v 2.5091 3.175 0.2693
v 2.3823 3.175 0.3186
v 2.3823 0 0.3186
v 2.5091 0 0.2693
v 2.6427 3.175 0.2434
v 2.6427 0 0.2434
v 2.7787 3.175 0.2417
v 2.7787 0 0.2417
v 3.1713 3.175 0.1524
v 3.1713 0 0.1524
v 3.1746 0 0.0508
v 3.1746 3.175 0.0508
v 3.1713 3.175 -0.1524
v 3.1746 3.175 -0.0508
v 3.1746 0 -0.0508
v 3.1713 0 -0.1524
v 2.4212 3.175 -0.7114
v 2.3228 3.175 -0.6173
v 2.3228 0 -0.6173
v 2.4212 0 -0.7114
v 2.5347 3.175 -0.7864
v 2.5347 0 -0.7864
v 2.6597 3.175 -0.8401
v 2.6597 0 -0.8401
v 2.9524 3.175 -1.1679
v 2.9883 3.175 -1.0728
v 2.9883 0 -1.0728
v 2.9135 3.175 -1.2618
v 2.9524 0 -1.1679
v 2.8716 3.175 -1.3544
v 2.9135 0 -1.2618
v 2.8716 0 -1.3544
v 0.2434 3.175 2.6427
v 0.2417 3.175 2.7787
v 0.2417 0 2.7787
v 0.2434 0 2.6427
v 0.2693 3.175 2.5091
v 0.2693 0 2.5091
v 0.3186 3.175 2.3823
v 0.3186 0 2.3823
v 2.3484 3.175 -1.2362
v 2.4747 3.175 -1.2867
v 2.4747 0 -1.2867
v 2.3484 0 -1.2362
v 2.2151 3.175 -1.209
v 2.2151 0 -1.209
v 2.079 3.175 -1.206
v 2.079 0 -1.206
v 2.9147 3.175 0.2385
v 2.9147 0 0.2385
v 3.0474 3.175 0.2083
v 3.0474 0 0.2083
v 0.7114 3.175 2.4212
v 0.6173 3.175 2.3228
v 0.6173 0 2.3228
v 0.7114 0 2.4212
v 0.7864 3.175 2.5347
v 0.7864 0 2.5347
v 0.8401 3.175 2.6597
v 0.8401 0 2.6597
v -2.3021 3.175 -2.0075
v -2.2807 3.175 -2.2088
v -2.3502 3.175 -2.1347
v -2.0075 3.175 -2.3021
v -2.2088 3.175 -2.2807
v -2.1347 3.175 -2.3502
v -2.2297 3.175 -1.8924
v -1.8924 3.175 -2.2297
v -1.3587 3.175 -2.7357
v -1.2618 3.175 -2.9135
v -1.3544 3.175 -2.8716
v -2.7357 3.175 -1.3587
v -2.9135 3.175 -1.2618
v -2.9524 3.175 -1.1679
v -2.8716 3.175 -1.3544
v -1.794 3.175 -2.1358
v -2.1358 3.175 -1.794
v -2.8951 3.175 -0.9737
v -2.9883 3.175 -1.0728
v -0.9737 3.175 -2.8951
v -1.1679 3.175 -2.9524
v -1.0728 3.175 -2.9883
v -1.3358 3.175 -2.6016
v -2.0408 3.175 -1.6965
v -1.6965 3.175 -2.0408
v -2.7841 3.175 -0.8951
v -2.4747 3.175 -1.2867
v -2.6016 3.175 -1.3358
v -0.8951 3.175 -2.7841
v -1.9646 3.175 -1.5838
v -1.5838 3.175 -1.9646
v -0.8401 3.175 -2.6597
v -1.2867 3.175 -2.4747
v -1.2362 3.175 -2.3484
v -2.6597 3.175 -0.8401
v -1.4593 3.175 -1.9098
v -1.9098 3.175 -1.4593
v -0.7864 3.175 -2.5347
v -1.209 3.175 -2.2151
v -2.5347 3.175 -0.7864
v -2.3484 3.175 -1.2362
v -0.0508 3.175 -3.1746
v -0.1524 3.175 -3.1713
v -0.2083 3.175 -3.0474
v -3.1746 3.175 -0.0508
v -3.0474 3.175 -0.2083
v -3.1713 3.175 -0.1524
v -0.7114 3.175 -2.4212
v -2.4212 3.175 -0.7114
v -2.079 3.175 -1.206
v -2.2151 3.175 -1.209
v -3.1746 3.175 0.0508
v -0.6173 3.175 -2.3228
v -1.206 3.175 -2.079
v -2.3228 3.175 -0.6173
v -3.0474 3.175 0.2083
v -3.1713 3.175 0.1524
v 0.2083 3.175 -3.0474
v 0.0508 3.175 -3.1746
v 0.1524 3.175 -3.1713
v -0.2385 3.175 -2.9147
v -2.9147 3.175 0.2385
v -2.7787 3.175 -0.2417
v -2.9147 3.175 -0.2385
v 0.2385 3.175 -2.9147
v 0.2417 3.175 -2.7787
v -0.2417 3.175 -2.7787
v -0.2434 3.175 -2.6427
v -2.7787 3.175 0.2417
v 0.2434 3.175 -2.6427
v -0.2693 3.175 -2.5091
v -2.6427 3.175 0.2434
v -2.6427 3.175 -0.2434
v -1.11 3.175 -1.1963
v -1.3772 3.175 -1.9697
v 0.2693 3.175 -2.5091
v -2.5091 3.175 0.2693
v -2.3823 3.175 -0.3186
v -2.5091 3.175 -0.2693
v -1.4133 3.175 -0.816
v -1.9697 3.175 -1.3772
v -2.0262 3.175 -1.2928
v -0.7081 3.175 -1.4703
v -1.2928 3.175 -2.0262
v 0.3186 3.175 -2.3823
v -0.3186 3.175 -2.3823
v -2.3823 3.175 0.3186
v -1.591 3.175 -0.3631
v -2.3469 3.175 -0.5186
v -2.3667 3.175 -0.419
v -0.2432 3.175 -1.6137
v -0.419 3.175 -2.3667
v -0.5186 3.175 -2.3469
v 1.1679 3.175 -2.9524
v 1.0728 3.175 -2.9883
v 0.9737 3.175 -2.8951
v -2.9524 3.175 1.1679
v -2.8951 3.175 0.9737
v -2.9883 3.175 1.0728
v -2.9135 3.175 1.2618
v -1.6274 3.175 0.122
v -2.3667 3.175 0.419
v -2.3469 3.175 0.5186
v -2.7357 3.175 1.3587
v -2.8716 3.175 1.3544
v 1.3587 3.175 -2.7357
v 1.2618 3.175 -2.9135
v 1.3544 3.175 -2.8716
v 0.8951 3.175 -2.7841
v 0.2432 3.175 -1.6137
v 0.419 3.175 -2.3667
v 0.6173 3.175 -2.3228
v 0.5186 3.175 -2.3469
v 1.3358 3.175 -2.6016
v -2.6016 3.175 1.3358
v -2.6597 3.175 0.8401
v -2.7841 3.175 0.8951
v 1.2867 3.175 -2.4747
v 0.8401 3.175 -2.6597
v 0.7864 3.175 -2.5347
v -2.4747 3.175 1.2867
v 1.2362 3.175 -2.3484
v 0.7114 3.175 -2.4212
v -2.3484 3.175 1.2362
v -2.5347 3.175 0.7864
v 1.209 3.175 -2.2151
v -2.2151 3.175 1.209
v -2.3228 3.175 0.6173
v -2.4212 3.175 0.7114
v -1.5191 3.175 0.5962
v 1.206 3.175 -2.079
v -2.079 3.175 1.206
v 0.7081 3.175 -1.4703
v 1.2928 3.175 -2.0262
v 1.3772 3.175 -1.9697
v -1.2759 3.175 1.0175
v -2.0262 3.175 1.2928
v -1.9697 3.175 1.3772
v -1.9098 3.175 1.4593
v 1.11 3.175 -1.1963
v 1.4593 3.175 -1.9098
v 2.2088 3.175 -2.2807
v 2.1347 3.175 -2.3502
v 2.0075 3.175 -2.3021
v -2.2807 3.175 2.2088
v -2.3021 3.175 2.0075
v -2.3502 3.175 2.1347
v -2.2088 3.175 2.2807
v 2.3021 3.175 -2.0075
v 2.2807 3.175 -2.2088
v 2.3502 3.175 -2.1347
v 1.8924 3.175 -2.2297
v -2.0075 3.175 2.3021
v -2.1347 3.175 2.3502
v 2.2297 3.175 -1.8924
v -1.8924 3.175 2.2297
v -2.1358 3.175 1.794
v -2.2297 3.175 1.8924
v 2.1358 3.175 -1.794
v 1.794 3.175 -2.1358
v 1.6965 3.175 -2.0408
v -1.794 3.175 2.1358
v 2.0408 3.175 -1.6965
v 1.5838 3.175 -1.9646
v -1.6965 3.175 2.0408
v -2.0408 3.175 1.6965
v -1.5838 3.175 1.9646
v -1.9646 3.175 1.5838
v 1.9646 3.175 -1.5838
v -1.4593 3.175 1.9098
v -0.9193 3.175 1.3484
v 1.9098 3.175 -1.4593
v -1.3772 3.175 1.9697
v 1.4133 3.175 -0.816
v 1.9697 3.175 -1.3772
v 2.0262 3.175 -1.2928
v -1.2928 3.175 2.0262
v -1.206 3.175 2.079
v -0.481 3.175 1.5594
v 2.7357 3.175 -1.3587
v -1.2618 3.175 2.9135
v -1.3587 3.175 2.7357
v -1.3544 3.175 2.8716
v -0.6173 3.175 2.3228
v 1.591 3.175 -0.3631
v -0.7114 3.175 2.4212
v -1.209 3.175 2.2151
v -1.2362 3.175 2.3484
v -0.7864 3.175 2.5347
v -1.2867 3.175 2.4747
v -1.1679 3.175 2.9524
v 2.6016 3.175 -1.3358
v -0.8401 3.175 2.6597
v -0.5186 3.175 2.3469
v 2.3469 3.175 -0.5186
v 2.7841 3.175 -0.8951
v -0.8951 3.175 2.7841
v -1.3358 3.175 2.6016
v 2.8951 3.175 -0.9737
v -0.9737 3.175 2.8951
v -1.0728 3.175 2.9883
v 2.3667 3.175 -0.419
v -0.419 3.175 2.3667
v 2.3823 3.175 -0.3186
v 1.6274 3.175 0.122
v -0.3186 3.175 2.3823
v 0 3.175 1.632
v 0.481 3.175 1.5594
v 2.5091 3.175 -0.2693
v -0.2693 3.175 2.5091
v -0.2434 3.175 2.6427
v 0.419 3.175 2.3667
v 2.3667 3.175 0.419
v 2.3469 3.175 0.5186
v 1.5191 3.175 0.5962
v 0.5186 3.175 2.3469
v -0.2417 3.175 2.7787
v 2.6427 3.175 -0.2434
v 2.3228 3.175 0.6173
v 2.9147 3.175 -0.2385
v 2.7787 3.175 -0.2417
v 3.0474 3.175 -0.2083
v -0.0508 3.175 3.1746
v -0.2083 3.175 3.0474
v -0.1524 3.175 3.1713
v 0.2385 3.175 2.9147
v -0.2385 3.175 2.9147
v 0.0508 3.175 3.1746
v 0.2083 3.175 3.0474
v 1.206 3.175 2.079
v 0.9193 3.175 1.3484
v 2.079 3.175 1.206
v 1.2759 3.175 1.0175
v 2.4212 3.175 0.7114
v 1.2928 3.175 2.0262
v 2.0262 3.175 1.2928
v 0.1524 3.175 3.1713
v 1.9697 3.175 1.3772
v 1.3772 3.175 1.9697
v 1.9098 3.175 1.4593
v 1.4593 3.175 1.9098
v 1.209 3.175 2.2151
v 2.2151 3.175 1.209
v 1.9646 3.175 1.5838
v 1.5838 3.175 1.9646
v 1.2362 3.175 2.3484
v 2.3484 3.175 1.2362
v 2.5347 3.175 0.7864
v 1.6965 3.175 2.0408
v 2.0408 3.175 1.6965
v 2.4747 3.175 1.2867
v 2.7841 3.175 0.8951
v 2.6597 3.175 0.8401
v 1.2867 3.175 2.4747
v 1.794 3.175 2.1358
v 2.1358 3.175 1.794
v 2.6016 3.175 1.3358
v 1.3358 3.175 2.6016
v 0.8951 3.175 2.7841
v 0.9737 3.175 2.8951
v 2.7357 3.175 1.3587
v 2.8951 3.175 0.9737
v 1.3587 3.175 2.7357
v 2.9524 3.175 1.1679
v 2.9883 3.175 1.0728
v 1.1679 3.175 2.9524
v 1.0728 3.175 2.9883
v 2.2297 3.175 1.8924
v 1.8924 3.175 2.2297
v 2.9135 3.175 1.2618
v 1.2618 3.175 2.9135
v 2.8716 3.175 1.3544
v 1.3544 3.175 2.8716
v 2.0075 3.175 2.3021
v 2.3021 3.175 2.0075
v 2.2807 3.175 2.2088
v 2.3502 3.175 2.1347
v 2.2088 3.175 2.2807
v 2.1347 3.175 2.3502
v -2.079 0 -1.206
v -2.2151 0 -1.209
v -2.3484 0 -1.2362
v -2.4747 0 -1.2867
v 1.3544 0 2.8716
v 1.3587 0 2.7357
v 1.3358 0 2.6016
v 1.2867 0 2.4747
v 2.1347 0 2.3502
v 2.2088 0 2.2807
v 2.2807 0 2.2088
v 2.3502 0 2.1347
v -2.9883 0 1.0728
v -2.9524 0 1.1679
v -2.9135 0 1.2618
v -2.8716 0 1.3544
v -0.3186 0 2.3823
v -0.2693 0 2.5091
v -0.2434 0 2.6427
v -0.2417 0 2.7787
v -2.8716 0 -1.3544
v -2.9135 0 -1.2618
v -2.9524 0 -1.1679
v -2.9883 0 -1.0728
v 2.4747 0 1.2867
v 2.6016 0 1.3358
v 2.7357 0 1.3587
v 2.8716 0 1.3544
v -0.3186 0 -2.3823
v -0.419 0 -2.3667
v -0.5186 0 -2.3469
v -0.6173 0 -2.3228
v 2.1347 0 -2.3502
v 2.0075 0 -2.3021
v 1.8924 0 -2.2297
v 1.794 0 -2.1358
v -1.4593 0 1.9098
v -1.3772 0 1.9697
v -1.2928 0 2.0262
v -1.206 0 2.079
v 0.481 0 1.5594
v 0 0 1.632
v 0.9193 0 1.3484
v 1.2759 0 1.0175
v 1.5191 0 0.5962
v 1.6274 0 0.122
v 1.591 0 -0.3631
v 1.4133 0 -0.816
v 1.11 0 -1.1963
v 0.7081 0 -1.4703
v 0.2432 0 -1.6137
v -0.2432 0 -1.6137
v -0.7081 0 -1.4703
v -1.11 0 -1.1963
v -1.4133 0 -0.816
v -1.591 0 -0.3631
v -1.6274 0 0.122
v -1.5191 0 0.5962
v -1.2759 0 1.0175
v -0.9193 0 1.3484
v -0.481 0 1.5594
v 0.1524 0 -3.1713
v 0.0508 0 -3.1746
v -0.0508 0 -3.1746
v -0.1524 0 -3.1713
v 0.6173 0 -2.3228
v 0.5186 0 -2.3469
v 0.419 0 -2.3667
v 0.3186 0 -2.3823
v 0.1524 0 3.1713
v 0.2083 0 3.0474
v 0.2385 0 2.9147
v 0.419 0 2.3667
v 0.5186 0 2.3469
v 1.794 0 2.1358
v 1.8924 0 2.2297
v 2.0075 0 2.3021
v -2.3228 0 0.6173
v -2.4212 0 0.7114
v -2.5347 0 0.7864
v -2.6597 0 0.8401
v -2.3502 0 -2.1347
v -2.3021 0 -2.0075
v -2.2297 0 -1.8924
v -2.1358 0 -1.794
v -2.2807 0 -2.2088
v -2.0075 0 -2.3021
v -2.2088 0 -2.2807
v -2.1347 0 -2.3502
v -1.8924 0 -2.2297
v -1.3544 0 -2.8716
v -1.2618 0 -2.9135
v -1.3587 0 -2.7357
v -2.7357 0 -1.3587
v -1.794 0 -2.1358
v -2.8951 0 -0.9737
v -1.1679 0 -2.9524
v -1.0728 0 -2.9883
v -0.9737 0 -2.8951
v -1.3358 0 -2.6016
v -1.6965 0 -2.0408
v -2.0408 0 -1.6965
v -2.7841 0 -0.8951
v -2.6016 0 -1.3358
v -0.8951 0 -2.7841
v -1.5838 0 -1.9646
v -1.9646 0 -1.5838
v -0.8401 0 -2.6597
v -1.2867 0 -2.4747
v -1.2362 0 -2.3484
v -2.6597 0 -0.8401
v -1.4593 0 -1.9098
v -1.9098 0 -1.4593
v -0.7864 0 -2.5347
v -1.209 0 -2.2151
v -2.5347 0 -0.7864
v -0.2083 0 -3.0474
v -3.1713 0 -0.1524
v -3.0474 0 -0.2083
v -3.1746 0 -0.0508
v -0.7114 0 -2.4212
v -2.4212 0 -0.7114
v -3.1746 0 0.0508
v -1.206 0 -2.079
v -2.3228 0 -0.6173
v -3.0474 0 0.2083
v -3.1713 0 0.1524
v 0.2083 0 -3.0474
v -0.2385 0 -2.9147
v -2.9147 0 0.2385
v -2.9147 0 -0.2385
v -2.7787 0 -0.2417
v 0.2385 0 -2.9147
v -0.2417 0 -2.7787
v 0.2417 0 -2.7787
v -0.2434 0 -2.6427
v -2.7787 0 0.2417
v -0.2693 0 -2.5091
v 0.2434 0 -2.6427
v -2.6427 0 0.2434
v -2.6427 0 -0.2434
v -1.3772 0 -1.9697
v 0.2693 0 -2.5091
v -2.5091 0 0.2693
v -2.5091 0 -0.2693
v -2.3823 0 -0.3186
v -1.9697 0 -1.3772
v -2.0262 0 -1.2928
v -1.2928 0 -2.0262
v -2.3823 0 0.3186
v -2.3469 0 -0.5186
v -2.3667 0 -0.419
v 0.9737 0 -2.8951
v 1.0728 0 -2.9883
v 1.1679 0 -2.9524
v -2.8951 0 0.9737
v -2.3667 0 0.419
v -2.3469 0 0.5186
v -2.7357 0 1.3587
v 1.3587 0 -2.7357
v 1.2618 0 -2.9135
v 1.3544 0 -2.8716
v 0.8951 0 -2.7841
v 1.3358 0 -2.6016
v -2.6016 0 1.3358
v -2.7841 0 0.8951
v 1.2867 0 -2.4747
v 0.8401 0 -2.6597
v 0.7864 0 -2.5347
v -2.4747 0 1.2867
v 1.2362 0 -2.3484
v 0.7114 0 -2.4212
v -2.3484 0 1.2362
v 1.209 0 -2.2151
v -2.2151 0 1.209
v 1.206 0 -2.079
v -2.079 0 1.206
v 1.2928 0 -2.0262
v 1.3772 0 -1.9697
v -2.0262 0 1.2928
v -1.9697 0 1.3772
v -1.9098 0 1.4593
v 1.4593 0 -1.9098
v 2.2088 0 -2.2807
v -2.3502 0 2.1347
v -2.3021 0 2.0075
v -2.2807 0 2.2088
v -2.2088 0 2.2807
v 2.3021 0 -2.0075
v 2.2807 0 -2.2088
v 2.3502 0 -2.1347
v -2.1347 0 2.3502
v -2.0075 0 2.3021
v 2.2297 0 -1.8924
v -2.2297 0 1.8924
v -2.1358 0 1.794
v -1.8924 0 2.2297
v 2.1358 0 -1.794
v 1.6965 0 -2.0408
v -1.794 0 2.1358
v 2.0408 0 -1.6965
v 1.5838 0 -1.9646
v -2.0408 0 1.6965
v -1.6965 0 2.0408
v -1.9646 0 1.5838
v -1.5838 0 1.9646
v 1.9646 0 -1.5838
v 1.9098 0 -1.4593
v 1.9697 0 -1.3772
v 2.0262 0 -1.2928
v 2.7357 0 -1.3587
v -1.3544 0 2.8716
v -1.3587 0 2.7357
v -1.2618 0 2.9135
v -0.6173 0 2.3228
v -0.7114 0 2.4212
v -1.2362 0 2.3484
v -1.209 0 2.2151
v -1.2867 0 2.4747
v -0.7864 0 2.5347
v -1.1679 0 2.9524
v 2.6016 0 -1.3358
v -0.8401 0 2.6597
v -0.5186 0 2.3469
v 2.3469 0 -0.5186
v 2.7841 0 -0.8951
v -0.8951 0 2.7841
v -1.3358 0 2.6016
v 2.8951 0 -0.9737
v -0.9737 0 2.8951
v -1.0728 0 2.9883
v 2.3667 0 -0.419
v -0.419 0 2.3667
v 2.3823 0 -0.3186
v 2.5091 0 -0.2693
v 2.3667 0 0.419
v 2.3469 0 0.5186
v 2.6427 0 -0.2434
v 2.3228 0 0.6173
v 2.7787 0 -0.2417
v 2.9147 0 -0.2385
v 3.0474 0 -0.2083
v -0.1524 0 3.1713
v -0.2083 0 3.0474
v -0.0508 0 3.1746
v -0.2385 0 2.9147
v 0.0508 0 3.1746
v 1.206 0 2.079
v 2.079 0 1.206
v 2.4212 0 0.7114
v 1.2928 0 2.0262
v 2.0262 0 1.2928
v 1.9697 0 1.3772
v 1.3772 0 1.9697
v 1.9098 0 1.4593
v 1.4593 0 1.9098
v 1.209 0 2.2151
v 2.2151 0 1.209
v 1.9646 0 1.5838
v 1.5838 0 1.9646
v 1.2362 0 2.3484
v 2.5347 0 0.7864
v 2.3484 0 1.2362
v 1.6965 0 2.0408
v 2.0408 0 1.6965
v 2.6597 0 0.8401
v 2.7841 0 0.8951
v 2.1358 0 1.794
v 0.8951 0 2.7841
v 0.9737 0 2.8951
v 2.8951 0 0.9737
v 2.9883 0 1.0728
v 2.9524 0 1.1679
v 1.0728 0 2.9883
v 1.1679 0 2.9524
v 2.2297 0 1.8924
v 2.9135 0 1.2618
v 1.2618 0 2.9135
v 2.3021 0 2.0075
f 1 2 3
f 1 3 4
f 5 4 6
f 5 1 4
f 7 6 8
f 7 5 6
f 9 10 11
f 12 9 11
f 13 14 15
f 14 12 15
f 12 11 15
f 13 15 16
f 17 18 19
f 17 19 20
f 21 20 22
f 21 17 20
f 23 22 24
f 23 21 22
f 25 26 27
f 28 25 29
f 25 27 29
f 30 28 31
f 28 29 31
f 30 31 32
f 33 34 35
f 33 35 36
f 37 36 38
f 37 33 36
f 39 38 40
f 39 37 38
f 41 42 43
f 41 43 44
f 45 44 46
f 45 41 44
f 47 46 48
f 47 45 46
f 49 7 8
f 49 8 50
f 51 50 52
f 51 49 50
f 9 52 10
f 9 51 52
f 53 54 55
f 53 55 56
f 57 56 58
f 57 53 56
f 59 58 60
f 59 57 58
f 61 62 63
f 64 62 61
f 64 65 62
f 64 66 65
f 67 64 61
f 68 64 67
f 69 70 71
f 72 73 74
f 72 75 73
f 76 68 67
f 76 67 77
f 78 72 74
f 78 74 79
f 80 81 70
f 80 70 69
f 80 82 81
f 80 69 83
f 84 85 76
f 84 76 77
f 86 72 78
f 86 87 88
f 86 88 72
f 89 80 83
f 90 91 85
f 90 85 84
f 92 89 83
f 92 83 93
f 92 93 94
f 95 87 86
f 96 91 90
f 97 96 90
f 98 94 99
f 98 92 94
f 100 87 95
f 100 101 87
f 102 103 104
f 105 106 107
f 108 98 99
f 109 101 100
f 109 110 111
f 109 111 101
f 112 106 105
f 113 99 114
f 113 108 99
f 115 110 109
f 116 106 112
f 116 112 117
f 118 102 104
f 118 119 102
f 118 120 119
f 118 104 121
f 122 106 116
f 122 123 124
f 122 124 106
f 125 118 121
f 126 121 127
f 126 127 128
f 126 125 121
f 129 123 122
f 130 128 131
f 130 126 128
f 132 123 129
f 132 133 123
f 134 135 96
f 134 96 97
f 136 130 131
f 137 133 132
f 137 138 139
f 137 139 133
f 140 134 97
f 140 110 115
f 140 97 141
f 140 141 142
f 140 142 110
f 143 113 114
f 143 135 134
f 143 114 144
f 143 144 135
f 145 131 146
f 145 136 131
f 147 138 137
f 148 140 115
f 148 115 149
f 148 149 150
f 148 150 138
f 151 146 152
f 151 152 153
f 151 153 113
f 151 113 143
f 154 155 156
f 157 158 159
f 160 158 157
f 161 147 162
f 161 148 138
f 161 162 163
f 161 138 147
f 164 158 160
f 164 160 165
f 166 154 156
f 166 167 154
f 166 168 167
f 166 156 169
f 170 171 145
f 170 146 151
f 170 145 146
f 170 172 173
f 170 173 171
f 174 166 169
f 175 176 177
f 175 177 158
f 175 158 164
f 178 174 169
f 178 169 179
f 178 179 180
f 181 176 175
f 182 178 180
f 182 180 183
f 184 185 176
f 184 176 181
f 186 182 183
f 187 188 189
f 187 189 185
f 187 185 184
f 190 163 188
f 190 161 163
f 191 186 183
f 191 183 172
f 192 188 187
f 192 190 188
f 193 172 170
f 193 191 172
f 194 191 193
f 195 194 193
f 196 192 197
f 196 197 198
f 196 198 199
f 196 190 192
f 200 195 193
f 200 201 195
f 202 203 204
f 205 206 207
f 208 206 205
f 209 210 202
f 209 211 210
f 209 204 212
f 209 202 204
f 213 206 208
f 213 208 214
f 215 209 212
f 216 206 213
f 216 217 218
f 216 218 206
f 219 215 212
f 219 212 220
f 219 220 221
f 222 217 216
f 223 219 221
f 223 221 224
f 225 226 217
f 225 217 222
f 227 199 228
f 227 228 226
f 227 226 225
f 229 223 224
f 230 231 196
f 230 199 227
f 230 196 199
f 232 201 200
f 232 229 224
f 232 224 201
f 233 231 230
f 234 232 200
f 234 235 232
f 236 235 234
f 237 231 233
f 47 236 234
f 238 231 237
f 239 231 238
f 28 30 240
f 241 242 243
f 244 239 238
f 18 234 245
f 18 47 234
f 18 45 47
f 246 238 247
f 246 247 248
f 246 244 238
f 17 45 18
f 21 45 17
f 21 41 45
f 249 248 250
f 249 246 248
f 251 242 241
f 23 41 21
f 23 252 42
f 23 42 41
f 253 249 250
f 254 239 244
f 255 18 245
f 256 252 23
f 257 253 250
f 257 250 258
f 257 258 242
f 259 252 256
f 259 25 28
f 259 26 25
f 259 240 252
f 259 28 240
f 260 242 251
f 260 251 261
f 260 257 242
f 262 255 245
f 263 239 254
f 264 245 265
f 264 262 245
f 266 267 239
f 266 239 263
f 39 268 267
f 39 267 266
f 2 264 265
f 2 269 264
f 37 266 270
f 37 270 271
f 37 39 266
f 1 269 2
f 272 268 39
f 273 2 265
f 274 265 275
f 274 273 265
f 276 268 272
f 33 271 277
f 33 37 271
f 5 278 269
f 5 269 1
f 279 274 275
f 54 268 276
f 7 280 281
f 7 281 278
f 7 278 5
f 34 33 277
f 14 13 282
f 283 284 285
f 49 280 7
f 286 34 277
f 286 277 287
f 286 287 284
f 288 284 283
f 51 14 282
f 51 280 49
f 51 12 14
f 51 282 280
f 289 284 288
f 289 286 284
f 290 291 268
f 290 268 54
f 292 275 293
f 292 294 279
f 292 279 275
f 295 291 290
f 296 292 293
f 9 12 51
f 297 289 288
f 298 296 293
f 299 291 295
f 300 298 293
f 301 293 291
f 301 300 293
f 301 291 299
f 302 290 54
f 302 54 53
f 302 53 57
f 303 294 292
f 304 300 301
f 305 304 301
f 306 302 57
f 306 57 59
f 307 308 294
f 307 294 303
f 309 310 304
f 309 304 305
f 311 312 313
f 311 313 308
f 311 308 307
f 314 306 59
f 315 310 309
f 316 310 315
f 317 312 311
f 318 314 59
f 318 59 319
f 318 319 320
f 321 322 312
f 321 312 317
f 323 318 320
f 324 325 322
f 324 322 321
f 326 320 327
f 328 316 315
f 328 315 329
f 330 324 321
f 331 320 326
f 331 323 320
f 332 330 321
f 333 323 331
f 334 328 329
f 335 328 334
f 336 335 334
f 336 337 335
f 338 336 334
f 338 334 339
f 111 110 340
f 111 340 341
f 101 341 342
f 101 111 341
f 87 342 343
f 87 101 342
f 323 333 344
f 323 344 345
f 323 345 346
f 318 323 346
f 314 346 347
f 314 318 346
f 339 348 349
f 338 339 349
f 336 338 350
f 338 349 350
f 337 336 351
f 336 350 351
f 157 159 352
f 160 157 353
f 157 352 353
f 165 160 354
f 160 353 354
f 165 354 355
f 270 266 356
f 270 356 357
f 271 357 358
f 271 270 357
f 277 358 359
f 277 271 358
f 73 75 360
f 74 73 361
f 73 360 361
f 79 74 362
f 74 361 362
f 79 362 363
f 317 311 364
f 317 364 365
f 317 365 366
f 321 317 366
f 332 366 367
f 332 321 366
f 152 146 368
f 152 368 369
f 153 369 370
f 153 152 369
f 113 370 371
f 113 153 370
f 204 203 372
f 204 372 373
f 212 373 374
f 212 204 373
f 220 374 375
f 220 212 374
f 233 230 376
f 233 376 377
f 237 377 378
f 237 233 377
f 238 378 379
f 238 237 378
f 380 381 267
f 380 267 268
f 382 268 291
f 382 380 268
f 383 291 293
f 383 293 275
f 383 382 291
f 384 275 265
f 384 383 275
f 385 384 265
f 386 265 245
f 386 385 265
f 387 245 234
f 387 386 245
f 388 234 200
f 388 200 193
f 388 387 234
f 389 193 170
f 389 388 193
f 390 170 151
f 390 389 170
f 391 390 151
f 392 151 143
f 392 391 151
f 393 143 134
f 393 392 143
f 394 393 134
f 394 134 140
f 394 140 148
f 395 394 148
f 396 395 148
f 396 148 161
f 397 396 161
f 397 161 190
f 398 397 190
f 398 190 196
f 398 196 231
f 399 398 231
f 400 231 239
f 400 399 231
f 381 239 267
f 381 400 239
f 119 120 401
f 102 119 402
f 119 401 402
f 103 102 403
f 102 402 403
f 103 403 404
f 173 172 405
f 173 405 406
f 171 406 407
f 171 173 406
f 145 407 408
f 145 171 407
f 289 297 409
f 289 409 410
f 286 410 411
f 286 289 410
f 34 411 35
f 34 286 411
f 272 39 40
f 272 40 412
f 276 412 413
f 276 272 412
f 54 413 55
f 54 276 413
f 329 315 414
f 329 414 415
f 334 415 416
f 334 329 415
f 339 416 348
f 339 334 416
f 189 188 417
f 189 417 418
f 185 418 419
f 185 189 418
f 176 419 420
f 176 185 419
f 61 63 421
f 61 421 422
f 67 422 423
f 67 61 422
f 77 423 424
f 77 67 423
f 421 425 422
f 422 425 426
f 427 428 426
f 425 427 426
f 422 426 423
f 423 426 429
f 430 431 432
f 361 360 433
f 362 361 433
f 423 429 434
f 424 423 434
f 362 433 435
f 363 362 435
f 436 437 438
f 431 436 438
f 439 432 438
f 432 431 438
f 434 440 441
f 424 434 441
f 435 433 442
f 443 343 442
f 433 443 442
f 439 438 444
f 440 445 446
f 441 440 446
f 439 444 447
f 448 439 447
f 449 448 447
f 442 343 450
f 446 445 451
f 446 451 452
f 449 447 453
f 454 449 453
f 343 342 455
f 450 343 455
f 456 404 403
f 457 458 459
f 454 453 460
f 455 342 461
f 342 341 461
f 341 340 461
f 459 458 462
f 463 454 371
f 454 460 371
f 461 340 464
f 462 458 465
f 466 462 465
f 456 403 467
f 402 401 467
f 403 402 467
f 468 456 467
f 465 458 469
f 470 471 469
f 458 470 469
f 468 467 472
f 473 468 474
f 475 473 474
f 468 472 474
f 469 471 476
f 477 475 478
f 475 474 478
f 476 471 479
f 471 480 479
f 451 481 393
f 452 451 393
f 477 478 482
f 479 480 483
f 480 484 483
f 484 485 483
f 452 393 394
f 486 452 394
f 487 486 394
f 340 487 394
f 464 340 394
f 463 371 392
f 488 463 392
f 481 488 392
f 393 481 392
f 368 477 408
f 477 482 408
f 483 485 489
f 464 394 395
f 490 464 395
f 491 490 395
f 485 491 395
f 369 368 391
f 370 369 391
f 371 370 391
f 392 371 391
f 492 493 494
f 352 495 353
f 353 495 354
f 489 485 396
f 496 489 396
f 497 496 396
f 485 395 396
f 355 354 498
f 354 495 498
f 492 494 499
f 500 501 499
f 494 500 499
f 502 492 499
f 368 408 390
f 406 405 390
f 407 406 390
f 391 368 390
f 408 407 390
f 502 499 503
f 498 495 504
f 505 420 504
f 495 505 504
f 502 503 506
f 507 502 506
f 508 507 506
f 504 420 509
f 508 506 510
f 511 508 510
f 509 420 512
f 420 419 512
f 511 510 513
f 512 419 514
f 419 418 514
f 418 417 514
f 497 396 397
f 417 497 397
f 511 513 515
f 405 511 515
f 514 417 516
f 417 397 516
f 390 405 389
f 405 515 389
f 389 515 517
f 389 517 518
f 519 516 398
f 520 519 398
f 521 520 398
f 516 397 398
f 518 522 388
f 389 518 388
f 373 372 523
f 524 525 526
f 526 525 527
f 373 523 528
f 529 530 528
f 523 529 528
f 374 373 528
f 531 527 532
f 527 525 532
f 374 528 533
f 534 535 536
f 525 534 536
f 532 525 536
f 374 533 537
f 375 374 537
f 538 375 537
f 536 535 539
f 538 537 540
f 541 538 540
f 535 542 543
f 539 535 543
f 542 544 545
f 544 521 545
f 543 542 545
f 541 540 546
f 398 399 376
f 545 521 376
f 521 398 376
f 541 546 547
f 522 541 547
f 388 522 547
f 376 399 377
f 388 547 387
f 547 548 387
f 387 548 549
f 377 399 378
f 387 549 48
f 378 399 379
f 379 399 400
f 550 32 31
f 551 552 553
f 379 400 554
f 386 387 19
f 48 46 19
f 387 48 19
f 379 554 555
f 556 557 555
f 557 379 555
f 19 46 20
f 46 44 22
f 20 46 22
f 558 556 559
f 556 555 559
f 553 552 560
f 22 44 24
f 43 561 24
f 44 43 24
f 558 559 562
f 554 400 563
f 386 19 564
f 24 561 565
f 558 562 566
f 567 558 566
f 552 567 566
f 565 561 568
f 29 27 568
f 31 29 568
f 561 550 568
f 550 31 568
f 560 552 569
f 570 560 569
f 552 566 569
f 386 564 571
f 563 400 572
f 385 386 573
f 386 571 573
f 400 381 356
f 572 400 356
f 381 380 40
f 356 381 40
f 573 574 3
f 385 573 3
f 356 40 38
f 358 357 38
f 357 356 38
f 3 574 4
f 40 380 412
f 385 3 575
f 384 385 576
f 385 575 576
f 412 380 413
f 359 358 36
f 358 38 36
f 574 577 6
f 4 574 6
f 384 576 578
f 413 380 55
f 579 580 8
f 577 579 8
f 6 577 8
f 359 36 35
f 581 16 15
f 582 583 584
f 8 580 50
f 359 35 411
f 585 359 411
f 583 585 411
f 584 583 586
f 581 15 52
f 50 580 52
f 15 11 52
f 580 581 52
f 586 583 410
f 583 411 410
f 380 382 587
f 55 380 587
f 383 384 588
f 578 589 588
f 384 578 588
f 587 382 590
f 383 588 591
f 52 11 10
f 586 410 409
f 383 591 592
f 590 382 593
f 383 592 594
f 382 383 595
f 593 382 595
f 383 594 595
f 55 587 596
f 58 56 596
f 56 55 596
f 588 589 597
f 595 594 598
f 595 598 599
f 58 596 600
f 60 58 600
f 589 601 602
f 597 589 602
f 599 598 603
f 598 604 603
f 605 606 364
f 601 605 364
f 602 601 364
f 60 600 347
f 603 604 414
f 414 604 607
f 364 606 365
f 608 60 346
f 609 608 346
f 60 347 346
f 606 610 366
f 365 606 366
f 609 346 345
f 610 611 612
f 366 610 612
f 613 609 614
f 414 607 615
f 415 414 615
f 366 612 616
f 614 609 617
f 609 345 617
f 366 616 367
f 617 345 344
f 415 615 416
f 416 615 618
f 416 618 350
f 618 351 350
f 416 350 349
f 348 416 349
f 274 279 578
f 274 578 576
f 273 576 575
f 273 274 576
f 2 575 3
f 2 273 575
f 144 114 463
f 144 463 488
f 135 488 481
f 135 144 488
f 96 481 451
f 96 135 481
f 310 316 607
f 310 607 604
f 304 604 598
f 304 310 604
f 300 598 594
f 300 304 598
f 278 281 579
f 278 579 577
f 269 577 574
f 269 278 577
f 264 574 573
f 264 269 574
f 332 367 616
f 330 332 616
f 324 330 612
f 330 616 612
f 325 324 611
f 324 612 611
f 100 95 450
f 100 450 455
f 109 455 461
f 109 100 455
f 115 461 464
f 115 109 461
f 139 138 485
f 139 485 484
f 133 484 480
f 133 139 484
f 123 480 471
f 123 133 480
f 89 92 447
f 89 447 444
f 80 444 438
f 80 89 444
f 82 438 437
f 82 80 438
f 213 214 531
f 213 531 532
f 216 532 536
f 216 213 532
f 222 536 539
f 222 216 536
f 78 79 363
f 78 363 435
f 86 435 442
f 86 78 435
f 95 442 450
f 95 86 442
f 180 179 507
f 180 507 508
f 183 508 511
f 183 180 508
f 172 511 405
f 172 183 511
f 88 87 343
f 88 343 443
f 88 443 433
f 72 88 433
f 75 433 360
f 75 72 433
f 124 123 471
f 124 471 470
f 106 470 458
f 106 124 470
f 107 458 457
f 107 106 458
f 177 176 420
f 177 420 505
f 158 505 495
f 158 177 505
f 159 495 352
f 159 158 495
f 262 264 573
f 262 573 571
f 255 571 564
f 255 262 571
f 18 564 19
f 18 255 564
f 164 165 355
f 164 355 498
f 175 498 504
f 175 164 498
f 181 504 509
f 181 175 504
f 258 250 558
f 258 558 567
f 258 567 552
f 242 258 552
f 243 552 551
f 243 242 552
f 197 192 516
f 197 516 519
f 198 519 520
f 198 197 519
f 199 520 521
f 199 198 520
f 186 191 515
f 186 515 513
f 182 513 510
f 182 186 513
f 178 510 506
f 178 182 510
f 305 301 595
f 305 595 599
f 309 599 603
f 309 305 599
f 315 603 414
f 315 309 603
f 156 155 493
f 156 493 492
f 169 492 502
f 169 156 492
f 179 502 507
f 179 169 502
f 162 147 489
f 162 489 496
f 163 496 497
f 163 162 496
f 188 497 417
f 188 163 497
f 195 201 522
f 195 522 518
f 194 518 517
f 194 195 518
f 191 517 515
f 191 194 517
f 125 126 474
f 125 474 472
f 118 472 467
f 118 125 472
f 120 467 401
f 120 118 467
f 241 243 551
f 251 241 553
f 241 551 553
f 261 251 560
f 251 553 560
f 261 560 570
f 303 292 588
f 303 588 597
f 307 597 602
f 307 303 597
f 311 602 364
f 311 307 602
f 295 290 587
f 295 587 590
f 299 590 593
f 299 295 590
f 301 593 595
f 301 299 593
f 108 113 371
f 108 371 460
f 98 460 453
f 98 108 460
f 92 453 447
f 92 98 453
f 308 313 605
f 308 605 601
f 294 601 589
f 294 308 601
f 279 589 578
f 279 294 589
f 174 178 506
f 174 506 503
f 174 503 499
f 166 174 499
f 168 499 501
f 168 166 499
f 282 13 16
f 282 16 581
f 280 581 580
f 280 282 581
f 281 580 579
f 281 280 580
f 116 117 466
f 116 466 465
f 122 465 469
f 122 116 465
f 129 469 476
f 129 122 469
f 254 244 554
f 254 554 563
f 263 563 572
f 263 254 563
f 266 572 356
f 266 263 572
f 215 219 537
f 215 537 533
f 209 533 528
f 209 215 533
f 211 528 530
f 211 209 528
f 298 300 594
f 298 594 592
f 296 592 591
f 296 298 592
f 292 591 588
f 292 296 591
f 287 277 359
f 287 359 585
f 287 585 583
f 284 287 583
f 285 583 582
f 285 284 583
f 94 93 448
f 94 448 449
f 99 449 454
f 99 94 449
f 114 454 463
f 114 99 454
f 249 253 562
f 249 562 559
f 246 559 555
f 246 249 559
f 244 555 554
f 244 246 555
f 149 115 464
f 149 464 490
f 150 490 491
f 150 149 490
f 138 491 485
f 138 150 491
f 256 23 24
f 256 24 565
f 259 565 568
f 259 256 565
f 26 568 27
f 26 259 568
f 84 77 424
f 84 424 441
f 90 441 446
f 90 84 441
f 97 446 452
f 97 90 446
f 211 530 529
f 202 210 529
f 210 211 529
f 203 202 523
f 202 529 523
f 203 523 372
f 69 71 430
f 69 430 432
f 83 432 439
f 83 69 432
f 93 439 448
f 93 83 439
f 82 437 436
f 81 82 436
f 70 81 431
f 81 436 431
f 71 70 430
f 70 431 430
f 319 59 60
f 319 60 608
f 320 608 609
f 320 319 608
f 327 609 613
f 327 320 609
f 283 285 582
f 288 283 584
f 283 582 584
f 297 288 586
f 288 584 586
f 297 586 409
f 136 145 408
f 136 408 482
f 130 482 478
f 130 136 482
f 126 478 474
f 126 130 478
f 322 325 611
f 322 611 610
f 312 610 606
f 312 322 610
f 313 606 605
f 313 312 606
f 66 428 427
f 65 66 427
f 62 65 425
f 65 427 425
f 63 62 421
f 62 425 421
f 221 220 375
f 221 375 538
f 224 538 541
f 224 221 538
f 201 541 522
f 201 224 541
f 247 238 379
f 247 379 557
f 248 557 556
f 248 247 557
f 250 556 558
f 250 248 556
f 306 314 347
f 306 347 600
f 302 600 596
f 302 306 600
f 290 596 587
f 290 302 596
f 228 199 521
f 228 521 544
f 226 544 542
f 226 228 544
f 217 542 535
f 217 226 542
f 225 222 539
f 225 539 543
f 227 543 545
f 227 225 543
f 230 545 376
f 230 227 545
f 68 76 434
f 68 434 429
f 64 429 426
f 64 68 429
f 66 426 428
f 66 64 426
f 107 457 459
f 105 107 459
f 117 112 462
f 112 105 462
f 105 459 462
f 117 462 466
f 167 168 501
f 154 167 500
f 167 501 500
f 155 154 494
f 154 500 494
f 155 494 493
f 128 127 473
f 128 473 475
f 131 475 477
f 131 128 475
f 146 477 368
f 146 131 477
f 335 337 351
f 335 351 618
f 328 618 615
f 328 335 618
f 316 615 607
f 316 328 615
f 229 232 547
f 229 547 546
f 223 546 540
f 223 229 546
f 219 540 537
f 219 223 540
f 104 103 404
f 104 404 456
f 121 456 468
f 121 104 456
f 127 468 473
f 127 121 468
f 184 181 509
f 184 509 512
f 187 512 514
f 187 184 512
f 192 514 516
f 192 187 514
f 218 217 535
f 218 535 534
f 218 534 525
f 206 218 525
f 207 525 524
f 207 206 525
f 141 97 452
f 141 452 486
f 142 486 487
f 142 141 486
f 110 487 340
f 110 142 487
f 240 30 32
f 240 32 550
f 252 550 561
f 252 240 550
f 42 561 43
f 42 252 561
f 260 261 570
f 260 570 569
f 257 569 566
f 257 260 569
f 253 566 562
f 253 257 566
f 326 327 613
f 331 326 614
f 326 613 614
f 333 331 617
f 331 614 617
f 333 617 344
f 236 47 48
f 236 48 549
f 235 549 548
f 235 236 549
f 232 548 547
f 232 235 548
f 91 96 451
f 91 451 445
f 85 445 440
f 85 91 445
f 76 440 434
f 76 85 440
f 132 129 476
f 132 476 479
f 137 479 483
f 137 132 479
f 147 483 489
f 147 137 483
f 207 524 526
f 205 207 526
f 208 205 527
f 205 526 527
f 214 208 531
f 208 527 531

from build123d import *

# Parameters (mm, degrees)
SKETCH1_R           = 3.175
SKETCH1_R_2         = 1.63195
BOSS_EXTRUDE1_DEPTH = 3.175
CUT_EXTRUDE1_DEPTH  = 6.499261314
CIRPATTERN1_COUNT   = 16


with BuildPart() as part:
    # Sketch1 → Boss-Extrude1 (new body)
    with BuildSketch(Plane(origin=(0, 0, 0), x_dir=(1, 0, 0), z_dir=(0, 1, 0))):
        with Locations(Location((0, 0, 0), (0, 0, 270))):
            Circle(SKETCH1_R)
        with Locations(Location((0, 0, 0), (0, 0, 270))):
            Circle(SKETCH1_R_2, mode=Mode.SUBTRACT)
    extrude(amount=BOSS_EXTRUDE1_DEPTH)

    # Sketch2 → Cut-Extrude1 (cut, through all)
    with BuildSketch(Plane(origin=(0, 3.175, 0), x_dir=(1, 0, 0), z_dir=(0, 1, 0))):
        with BuildLine():
            ThreePointArc((-0.1524, 3.171340291), (-0.226750807, 2.98179915), (-0.241694661, 2.778746034))
            ThreePointArc((-0.241694661, 2.778746034), (-0.25338078, 2.575323775), (-0.318555556, 2.382270856))
            ThreePointArc((-0.318555556, 2.382270856), (-0.468894712, 2.357292902), (-0.61734863, 2.322837219))
            ThreePointArc((-0.61734863, 2.322837219), (-0.751440425, 2.476253552), (-0.84008332, 2.659719129))
            ThreePointArc((-0.84008332, 2.659719129), (-0.931594704, 2.841596982), (-1.072820147, 2.98825734))
            ThreePointArc((-1.072820147, 2.98825734), (-0.619411772, 3.113993265), (-0.1524, 3.171340291))
        make_face()
    cut_extrude1 = extrude(amount=-CUT_EXTRUDE1_DEPTH, mode=Mode.SUBTRACT)

    # CirPattern1: Cut-Extrude1 ×16 about axis
    cirpattern1_axis = Axis((0, 0, 0), (0, 1, 0))
    for i in range(1, CIRPATTERN1_COUNT):
        add(cut_extrude1.rotate(cirpattern1_axis, i * 360 / CIRPATTERN1_COUNT), mode=Mode.SUBTRACT)


solid = part.part
